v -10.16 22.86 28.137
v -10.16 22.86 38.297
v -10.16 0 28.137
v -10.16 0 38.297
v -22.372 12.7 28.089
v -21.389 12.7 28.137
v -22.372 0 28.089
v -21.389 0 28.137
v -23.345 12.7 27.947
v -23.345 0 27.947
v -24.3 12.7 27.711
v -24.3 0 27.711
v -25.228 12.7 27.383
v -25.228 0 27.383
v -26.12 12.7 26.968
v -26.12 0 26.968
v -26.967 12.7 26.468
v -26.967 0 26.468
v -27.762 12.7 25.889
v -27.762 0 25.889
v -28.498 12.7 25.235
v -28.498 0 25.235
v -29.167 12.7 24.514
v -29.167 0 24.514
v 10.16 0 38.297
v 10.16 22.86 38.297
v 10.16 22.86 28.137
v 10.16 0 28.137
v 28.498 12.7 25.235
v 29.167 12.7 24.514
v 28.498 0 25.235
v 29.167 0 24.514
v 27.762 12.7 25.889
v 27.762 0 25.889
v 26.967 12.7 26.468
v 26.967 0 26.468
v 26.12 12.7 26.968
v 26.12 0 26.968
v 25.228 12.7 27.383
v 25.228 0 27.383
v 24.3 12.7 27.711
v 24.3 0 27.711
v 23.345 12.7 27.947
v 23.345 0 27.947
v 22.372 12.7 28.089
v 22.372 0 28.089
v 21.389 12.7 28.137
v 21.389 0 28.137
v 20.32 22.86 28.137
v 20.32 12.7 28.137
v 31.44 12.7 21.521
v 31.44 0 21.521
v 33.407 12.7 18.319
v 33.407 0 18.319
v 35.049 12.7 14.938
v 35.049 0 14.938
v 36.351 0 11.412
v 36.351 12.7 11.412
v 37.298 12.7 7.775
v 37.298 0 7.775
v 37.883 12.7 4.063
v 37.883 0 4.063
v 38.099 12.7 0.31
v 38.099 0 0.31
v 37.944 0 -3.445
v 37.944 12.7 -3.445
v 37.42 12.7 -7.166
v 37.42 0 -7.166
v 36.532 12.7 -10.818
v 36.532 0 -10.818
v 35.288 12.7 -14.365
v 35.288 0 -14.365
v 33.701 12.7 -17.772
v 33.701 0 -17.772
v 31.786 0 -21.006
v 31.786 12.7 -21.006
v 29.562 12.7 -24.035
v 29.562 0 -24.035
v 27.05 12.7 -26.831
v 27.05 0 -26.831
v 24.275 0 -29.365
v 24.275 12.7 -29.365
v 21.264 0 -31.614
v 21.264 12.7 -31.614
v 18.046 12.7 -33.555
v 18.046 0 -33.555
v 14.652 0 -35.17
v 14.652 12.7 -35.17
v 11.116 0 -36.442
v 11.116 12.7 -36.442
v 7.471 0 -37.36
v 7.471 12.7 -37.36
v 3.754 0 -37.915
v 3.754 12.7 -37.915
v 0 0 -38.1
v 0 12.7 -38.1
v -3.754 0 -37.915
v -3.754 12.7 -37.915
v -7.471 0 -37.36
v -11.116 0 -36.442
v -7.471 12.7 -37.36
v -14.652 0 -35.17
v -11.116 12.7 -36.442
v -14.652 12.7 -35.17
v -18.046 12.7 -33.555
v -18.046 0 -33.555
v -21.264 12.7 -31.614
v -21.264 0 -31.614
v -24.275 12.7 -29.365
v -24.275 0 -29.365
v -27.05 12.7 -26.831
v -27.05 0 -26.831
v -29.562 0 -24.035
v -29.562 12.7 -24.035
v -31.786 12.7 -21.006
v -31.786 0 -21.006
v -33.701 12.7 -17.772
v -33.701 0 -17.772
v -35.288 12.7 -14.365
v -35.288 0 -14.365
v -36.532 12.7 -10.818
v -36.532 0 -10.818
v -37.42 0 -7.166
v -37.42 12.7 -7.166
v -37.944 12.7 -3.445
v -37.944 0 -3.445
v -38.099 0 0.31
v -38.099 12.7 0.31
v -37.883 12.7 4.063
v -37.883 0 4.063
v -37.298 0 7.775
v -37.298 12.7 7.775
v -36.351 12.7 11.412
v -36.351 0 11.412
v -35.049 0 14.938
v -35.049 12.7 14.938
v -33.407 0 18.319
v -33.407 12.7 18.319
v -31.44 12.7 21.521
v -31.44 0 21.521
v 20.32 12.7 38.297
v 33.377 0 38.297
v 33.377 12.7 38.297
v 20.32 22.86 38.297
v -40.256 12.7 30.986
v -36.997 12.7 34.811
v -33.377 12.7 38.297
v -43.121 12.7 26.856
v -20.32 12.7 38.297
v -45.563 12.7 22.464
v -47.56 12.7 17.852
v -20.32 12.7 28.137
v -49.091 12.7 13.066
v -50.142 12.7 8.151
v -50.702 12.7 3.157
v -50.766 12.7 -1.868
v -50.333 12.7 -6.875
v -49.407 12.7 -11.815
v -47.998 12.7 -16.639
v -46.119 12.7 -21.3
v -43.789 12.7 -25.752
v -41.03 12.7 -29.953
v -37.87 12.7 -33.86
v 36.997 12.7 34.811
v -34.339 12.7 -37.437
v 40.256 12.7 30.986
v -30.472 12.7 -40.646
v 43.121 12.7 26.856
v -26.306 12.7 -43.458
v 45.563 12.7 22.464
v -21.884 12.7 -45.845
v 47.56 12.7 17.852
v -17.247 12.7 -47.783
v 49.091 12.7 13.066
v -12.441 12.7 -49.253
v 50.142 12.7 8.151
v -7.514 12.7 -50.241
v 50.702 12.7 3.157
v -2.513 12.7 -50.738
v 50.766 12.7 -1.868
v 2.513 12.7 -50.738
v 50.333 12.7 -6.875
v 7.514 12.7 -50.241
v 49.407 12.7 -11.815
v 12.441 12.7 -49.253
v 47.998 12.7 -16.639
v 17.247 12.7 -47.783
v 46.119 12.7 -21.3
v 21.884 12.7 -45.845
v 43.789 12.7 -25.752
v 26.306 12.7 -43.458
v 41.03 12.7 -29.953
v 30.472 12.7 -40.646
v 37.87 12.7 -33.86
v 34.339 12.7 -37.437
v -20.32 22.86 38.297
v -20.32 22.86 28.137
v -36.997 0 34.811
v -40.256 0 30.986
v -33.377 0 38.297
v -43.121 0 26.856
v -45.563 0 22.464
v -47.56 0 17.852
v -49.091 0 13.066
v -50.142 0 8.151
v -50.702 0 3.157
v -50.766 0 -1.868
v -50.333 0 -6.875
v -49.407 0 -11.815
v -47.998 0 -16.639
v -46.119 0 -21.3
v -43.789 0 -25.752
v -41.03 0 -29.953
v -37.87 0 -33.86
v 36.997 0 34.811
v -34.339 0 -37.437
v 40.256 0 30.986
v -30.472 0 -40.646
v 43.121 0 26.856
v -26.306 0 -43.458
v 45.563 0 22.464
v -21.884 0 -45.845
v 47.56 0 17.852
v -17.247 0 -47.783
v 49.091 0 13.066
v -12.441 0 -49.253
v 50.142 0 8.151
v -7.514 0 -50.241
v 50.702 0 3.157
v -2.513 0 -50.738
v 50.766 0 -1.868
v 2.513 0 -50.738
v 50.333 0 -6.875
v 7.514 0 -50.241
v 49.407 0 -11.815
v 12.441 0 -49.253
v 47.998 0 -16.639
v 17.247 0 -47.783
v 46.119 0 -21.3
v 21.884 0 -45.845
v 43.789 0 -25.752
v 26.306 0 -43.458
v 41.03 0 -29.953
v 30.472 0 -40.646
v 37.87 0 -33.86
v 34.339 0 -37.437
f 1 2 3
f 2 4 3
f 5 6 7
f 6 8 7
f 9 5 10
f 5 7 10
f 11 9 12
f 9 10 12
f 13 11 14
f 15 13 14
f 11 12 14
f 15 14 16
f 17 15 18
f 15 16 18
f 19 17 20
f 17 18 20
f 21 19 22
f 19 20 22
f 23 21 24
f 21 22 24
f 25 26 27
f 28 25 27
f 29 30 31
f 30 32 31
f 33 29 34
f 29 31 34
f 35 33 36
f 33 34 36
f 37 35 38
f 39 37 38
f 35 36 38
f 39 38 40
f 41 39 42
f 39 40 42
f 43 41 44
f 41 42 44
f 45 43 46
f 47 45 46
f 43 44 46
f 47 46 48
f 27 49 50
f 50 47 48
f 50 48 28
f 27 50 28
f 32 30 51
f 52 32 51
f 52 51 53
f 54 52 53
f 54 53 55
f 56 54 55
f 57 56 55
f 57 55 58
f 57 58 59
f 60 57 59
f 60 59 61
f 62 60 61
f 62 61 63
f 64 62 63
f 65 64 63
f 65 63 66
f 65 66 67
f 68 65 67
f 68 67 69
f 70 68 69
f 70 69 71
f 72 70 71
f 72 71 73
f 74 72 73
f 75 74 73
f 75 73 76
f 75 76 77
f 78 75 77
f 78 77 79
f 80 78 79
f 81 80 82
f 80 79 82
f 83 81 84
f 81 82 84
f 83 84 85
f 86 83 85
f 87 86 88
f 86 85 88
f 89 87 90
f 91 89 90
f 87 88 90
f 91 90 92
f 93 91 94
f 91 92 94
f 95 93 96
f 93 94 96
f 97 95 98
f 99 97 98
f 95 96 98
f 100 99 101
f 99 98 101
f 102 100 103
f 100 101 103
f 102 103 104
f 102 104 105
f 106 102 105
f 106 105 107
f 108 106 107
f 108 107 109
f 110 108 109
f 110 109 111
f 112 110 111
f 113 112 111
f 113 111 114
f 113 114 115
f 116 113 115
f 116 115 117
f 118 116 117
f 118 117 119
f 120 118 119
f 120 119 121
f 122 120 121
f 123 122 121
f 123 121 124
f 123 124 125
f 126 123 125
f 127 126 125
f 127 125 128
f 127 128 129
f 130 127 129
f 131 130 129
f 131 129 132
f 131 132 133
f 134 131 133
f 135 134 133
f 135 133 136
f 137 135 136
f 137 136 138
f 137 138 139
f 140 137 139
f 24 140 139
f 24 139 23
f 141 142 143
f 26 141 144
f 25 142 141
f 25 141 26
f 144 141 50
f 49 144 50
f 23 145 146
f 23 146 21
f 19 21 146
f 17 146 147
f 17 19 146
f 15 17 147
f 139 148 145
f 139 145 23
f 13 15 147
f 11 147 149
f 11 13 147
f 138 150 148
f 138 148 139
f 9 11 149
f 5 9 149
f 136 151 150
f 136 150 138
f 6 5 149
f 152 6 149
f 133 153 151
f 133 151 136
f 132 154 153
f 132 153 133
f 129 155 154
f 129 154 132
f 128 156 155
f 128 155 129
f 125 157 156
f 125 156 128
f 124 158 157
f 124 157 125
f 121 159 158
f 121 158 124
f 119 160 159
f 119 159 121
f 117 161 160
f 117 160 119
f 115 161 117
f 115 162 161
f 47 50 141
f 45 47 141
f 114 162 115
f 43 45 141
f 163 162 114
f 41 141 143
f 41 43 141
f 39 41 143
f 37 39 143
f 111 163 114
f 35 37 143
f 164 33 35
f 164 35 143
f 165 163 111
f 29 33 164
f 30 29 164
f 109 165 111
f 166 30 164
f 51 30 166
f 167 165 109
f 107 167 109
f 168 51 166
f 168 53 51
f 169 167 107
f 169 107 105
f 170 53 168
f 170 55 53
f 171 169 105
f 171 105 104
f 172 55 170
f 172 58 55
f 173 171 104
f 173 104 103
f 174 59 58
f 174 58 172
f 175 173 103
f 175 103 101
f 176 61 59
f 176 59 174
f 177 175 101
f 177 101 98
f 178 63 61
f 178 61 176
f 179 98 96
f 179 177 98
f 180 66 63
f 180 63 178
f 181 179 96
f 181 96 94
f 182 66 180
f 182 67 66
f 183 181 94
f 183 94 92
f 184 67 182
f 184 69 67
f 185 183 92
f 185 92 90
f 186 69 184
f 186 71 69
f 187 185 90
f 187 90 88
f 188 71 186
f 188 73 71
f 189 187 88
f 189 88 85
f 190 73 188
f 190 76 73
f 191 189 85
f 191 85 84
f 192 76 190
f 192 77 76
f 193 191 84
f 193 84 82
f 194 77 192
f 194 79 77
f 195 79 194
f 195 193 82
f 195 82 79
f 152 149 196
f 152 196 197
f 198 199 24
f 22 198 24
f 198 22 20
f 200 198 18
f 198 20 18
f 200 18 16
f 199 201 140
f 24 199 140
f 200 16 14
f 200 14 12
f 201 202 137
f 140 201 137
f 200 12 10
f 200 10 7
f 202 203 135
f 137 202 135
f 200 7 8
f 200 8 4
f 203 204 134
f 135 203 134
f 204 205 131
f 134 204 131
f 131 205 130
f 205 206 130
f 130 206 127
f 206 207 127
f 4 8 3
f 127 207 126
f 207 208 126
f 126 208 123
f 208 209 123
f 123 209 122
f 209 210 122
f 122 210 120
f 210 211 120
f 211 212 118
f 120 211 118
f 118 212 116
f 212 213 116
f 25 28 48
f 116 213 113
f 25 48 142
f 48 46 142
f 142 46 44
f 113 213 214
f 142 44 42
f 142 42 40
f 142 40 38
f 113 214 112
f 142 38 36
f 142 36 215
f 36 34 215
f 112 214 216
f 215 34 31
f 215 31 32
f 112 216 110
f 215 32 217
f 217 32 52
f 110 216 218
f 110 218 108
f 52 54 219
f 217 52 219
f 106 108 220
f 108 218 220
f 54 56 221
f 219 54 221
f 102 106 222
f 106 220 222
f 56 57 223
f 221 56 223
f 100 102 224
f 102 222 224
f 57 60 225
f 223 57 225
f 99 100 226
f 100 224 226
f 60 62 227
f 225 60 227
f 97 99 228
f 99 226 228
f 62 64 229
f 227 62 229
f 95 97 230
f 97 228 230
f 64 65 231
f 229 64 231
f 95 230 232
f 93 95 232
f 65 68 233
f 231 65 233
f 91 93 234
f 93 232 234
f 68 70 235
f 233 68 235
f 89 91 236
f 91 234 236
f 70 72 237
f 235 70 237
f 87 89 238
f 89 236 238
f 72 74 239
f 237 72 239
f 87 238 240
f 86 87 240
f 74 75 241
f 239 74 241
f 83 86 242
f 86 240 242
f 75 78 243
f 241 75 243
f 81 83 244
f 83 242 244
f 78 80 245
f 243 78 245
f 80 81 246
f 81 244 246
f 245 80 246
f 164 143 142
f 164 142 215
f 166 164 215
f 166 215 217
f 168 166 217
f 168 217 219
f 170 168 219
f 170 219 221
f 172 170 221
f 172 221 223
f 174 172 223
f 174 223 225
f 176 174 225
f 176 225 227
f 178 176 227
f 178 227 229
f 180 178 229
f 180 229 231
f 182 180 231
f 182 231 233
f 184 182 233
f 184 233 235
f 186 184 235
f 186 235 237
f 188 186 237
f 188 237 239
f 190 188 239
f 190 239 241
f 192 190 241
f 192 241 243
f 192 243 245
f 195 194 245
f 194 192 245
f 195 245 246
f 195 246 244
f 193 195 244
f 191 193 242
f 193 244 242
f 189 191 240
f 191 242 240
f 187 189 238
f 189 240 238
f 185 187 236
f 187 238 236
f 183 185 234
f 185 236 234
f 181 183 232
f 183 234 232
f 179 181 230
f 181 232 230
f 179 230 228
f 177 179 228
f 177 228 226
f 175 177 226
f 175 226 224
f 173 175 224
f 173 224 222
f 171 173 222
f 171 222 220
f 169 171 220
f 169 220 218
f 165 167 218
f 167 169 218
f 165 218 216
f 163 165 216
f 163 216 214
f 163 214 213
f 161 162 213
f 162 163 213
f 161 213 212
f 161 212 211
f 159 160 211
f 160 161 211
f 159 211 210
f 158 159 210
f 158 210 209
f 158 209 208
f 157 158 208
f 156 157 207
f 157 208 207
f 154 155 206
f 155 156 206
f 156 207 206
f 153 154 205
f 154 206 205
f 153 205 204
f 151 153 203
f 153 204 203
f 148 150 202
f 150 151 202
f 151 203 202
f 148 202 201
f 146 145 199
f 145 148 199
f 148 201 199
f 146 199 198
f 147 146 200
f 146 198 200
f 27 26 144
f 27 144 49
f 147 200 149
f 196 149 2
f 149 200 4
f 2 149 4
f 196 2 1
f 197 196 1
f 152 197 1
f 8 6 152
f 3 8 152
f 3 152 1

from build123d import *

# Parameters (mm, degrees)
SKETCH1_R           = 50.8
BOSS_EXTRUDE1_DEPTH = 12.7
CUT_EXTRUDE1_DEPTH  = 12.7
SKETCH3_W           = 10.16
SKETCH3_H           = 10.16
BOSS_EXTRUDE2_DEPTH = 10.16
FILLET1_R           = 10.16
FILLET2_R           = 10.16


with BuildPart() as part:
    # Sketch1 → Boss-Extrude1 (new body)
    with BuildSketch(Plane(origin=(0, 0, 0), x_dir=(1, 0, 0), z_dir=(0, 1, 0))):
        Circle(SKETCH1_R)
    extrude(amount=BOSS_EXTRUDE1_DEPTH)

    # Sketch2 → Cut-Extrude1 (cut)
    with BuildSketch(Plane(origin=(0, 12.7, 0), x_dir=(1, 0, 0), z_dir=(0, 1, 0))):
        with BuildLine():
            Line((-25.689206411, -28.136713987), (-10.16, -28.136713987))
            Line((-10.16, -28.136713987), (-10.16, -38.296713987))
            Line((-10.16, -38.296713987), (-33.376663971, -38.296713987))
            ThreePointArc((-33.376663971, -38.296713987), (0, -50.8), (33.376663971, -38.296713987))
            Line((33.376663971, -38.296713987), (10.16, -38.296713987))
            Line((10.16, -38.296713987), (10.16, -28.136713987))
            Line((10.16, -28.136713987), (25.689206411, -28.136713987))
            ThreePointArc((25.689206411, -28.136713987), (0, 38.1), (-25.689206411, -28.136713987))
        make_face()
    extrude(amount=-CUT_EXTRUDE1_DEPTH, mode=Mode.SUBTRACT)

    # Sketch3 → Boss-Extrude2 (add)
    with BuildSketch(Plane(origin=(-12.7, 12.7, 0), x_dir=(0, 0, -1), z_dir=(0, -1, 0))):
        with Locations((-33.216713987, -2.54)):
            Rectangle(SKETCH3_W, SKETCH3_H)
    boss_extrude2 = extrude(amount=-BOSS_EXTRUDE2_DEPTH)

    # Fillet1
    fillet1_edges = [part.edges().sort_by_distance(p)[0] for p in [
        (-25.689206411, 6.35, 28.136713987),
    ]]
    fillet(fillet1_edges, radius=FILLET1_R)

    # Mirror1: Boss-Extrude2 across plane
    add(boss_extrude2.mirror(Plane(origin=(0, 0, 0), x_dir=(0, 0, 1), z_dir=(1, 0, 0))))

    # Fillet2
    fillet2_edges = [part.edges().sort_by_distance(p)[0] for p in [
        (25.689206411, 6.35, 28.136713987),
    ]]
    fillet(fillet2_edges, radius=FILLET2_R)


solid = part.part
